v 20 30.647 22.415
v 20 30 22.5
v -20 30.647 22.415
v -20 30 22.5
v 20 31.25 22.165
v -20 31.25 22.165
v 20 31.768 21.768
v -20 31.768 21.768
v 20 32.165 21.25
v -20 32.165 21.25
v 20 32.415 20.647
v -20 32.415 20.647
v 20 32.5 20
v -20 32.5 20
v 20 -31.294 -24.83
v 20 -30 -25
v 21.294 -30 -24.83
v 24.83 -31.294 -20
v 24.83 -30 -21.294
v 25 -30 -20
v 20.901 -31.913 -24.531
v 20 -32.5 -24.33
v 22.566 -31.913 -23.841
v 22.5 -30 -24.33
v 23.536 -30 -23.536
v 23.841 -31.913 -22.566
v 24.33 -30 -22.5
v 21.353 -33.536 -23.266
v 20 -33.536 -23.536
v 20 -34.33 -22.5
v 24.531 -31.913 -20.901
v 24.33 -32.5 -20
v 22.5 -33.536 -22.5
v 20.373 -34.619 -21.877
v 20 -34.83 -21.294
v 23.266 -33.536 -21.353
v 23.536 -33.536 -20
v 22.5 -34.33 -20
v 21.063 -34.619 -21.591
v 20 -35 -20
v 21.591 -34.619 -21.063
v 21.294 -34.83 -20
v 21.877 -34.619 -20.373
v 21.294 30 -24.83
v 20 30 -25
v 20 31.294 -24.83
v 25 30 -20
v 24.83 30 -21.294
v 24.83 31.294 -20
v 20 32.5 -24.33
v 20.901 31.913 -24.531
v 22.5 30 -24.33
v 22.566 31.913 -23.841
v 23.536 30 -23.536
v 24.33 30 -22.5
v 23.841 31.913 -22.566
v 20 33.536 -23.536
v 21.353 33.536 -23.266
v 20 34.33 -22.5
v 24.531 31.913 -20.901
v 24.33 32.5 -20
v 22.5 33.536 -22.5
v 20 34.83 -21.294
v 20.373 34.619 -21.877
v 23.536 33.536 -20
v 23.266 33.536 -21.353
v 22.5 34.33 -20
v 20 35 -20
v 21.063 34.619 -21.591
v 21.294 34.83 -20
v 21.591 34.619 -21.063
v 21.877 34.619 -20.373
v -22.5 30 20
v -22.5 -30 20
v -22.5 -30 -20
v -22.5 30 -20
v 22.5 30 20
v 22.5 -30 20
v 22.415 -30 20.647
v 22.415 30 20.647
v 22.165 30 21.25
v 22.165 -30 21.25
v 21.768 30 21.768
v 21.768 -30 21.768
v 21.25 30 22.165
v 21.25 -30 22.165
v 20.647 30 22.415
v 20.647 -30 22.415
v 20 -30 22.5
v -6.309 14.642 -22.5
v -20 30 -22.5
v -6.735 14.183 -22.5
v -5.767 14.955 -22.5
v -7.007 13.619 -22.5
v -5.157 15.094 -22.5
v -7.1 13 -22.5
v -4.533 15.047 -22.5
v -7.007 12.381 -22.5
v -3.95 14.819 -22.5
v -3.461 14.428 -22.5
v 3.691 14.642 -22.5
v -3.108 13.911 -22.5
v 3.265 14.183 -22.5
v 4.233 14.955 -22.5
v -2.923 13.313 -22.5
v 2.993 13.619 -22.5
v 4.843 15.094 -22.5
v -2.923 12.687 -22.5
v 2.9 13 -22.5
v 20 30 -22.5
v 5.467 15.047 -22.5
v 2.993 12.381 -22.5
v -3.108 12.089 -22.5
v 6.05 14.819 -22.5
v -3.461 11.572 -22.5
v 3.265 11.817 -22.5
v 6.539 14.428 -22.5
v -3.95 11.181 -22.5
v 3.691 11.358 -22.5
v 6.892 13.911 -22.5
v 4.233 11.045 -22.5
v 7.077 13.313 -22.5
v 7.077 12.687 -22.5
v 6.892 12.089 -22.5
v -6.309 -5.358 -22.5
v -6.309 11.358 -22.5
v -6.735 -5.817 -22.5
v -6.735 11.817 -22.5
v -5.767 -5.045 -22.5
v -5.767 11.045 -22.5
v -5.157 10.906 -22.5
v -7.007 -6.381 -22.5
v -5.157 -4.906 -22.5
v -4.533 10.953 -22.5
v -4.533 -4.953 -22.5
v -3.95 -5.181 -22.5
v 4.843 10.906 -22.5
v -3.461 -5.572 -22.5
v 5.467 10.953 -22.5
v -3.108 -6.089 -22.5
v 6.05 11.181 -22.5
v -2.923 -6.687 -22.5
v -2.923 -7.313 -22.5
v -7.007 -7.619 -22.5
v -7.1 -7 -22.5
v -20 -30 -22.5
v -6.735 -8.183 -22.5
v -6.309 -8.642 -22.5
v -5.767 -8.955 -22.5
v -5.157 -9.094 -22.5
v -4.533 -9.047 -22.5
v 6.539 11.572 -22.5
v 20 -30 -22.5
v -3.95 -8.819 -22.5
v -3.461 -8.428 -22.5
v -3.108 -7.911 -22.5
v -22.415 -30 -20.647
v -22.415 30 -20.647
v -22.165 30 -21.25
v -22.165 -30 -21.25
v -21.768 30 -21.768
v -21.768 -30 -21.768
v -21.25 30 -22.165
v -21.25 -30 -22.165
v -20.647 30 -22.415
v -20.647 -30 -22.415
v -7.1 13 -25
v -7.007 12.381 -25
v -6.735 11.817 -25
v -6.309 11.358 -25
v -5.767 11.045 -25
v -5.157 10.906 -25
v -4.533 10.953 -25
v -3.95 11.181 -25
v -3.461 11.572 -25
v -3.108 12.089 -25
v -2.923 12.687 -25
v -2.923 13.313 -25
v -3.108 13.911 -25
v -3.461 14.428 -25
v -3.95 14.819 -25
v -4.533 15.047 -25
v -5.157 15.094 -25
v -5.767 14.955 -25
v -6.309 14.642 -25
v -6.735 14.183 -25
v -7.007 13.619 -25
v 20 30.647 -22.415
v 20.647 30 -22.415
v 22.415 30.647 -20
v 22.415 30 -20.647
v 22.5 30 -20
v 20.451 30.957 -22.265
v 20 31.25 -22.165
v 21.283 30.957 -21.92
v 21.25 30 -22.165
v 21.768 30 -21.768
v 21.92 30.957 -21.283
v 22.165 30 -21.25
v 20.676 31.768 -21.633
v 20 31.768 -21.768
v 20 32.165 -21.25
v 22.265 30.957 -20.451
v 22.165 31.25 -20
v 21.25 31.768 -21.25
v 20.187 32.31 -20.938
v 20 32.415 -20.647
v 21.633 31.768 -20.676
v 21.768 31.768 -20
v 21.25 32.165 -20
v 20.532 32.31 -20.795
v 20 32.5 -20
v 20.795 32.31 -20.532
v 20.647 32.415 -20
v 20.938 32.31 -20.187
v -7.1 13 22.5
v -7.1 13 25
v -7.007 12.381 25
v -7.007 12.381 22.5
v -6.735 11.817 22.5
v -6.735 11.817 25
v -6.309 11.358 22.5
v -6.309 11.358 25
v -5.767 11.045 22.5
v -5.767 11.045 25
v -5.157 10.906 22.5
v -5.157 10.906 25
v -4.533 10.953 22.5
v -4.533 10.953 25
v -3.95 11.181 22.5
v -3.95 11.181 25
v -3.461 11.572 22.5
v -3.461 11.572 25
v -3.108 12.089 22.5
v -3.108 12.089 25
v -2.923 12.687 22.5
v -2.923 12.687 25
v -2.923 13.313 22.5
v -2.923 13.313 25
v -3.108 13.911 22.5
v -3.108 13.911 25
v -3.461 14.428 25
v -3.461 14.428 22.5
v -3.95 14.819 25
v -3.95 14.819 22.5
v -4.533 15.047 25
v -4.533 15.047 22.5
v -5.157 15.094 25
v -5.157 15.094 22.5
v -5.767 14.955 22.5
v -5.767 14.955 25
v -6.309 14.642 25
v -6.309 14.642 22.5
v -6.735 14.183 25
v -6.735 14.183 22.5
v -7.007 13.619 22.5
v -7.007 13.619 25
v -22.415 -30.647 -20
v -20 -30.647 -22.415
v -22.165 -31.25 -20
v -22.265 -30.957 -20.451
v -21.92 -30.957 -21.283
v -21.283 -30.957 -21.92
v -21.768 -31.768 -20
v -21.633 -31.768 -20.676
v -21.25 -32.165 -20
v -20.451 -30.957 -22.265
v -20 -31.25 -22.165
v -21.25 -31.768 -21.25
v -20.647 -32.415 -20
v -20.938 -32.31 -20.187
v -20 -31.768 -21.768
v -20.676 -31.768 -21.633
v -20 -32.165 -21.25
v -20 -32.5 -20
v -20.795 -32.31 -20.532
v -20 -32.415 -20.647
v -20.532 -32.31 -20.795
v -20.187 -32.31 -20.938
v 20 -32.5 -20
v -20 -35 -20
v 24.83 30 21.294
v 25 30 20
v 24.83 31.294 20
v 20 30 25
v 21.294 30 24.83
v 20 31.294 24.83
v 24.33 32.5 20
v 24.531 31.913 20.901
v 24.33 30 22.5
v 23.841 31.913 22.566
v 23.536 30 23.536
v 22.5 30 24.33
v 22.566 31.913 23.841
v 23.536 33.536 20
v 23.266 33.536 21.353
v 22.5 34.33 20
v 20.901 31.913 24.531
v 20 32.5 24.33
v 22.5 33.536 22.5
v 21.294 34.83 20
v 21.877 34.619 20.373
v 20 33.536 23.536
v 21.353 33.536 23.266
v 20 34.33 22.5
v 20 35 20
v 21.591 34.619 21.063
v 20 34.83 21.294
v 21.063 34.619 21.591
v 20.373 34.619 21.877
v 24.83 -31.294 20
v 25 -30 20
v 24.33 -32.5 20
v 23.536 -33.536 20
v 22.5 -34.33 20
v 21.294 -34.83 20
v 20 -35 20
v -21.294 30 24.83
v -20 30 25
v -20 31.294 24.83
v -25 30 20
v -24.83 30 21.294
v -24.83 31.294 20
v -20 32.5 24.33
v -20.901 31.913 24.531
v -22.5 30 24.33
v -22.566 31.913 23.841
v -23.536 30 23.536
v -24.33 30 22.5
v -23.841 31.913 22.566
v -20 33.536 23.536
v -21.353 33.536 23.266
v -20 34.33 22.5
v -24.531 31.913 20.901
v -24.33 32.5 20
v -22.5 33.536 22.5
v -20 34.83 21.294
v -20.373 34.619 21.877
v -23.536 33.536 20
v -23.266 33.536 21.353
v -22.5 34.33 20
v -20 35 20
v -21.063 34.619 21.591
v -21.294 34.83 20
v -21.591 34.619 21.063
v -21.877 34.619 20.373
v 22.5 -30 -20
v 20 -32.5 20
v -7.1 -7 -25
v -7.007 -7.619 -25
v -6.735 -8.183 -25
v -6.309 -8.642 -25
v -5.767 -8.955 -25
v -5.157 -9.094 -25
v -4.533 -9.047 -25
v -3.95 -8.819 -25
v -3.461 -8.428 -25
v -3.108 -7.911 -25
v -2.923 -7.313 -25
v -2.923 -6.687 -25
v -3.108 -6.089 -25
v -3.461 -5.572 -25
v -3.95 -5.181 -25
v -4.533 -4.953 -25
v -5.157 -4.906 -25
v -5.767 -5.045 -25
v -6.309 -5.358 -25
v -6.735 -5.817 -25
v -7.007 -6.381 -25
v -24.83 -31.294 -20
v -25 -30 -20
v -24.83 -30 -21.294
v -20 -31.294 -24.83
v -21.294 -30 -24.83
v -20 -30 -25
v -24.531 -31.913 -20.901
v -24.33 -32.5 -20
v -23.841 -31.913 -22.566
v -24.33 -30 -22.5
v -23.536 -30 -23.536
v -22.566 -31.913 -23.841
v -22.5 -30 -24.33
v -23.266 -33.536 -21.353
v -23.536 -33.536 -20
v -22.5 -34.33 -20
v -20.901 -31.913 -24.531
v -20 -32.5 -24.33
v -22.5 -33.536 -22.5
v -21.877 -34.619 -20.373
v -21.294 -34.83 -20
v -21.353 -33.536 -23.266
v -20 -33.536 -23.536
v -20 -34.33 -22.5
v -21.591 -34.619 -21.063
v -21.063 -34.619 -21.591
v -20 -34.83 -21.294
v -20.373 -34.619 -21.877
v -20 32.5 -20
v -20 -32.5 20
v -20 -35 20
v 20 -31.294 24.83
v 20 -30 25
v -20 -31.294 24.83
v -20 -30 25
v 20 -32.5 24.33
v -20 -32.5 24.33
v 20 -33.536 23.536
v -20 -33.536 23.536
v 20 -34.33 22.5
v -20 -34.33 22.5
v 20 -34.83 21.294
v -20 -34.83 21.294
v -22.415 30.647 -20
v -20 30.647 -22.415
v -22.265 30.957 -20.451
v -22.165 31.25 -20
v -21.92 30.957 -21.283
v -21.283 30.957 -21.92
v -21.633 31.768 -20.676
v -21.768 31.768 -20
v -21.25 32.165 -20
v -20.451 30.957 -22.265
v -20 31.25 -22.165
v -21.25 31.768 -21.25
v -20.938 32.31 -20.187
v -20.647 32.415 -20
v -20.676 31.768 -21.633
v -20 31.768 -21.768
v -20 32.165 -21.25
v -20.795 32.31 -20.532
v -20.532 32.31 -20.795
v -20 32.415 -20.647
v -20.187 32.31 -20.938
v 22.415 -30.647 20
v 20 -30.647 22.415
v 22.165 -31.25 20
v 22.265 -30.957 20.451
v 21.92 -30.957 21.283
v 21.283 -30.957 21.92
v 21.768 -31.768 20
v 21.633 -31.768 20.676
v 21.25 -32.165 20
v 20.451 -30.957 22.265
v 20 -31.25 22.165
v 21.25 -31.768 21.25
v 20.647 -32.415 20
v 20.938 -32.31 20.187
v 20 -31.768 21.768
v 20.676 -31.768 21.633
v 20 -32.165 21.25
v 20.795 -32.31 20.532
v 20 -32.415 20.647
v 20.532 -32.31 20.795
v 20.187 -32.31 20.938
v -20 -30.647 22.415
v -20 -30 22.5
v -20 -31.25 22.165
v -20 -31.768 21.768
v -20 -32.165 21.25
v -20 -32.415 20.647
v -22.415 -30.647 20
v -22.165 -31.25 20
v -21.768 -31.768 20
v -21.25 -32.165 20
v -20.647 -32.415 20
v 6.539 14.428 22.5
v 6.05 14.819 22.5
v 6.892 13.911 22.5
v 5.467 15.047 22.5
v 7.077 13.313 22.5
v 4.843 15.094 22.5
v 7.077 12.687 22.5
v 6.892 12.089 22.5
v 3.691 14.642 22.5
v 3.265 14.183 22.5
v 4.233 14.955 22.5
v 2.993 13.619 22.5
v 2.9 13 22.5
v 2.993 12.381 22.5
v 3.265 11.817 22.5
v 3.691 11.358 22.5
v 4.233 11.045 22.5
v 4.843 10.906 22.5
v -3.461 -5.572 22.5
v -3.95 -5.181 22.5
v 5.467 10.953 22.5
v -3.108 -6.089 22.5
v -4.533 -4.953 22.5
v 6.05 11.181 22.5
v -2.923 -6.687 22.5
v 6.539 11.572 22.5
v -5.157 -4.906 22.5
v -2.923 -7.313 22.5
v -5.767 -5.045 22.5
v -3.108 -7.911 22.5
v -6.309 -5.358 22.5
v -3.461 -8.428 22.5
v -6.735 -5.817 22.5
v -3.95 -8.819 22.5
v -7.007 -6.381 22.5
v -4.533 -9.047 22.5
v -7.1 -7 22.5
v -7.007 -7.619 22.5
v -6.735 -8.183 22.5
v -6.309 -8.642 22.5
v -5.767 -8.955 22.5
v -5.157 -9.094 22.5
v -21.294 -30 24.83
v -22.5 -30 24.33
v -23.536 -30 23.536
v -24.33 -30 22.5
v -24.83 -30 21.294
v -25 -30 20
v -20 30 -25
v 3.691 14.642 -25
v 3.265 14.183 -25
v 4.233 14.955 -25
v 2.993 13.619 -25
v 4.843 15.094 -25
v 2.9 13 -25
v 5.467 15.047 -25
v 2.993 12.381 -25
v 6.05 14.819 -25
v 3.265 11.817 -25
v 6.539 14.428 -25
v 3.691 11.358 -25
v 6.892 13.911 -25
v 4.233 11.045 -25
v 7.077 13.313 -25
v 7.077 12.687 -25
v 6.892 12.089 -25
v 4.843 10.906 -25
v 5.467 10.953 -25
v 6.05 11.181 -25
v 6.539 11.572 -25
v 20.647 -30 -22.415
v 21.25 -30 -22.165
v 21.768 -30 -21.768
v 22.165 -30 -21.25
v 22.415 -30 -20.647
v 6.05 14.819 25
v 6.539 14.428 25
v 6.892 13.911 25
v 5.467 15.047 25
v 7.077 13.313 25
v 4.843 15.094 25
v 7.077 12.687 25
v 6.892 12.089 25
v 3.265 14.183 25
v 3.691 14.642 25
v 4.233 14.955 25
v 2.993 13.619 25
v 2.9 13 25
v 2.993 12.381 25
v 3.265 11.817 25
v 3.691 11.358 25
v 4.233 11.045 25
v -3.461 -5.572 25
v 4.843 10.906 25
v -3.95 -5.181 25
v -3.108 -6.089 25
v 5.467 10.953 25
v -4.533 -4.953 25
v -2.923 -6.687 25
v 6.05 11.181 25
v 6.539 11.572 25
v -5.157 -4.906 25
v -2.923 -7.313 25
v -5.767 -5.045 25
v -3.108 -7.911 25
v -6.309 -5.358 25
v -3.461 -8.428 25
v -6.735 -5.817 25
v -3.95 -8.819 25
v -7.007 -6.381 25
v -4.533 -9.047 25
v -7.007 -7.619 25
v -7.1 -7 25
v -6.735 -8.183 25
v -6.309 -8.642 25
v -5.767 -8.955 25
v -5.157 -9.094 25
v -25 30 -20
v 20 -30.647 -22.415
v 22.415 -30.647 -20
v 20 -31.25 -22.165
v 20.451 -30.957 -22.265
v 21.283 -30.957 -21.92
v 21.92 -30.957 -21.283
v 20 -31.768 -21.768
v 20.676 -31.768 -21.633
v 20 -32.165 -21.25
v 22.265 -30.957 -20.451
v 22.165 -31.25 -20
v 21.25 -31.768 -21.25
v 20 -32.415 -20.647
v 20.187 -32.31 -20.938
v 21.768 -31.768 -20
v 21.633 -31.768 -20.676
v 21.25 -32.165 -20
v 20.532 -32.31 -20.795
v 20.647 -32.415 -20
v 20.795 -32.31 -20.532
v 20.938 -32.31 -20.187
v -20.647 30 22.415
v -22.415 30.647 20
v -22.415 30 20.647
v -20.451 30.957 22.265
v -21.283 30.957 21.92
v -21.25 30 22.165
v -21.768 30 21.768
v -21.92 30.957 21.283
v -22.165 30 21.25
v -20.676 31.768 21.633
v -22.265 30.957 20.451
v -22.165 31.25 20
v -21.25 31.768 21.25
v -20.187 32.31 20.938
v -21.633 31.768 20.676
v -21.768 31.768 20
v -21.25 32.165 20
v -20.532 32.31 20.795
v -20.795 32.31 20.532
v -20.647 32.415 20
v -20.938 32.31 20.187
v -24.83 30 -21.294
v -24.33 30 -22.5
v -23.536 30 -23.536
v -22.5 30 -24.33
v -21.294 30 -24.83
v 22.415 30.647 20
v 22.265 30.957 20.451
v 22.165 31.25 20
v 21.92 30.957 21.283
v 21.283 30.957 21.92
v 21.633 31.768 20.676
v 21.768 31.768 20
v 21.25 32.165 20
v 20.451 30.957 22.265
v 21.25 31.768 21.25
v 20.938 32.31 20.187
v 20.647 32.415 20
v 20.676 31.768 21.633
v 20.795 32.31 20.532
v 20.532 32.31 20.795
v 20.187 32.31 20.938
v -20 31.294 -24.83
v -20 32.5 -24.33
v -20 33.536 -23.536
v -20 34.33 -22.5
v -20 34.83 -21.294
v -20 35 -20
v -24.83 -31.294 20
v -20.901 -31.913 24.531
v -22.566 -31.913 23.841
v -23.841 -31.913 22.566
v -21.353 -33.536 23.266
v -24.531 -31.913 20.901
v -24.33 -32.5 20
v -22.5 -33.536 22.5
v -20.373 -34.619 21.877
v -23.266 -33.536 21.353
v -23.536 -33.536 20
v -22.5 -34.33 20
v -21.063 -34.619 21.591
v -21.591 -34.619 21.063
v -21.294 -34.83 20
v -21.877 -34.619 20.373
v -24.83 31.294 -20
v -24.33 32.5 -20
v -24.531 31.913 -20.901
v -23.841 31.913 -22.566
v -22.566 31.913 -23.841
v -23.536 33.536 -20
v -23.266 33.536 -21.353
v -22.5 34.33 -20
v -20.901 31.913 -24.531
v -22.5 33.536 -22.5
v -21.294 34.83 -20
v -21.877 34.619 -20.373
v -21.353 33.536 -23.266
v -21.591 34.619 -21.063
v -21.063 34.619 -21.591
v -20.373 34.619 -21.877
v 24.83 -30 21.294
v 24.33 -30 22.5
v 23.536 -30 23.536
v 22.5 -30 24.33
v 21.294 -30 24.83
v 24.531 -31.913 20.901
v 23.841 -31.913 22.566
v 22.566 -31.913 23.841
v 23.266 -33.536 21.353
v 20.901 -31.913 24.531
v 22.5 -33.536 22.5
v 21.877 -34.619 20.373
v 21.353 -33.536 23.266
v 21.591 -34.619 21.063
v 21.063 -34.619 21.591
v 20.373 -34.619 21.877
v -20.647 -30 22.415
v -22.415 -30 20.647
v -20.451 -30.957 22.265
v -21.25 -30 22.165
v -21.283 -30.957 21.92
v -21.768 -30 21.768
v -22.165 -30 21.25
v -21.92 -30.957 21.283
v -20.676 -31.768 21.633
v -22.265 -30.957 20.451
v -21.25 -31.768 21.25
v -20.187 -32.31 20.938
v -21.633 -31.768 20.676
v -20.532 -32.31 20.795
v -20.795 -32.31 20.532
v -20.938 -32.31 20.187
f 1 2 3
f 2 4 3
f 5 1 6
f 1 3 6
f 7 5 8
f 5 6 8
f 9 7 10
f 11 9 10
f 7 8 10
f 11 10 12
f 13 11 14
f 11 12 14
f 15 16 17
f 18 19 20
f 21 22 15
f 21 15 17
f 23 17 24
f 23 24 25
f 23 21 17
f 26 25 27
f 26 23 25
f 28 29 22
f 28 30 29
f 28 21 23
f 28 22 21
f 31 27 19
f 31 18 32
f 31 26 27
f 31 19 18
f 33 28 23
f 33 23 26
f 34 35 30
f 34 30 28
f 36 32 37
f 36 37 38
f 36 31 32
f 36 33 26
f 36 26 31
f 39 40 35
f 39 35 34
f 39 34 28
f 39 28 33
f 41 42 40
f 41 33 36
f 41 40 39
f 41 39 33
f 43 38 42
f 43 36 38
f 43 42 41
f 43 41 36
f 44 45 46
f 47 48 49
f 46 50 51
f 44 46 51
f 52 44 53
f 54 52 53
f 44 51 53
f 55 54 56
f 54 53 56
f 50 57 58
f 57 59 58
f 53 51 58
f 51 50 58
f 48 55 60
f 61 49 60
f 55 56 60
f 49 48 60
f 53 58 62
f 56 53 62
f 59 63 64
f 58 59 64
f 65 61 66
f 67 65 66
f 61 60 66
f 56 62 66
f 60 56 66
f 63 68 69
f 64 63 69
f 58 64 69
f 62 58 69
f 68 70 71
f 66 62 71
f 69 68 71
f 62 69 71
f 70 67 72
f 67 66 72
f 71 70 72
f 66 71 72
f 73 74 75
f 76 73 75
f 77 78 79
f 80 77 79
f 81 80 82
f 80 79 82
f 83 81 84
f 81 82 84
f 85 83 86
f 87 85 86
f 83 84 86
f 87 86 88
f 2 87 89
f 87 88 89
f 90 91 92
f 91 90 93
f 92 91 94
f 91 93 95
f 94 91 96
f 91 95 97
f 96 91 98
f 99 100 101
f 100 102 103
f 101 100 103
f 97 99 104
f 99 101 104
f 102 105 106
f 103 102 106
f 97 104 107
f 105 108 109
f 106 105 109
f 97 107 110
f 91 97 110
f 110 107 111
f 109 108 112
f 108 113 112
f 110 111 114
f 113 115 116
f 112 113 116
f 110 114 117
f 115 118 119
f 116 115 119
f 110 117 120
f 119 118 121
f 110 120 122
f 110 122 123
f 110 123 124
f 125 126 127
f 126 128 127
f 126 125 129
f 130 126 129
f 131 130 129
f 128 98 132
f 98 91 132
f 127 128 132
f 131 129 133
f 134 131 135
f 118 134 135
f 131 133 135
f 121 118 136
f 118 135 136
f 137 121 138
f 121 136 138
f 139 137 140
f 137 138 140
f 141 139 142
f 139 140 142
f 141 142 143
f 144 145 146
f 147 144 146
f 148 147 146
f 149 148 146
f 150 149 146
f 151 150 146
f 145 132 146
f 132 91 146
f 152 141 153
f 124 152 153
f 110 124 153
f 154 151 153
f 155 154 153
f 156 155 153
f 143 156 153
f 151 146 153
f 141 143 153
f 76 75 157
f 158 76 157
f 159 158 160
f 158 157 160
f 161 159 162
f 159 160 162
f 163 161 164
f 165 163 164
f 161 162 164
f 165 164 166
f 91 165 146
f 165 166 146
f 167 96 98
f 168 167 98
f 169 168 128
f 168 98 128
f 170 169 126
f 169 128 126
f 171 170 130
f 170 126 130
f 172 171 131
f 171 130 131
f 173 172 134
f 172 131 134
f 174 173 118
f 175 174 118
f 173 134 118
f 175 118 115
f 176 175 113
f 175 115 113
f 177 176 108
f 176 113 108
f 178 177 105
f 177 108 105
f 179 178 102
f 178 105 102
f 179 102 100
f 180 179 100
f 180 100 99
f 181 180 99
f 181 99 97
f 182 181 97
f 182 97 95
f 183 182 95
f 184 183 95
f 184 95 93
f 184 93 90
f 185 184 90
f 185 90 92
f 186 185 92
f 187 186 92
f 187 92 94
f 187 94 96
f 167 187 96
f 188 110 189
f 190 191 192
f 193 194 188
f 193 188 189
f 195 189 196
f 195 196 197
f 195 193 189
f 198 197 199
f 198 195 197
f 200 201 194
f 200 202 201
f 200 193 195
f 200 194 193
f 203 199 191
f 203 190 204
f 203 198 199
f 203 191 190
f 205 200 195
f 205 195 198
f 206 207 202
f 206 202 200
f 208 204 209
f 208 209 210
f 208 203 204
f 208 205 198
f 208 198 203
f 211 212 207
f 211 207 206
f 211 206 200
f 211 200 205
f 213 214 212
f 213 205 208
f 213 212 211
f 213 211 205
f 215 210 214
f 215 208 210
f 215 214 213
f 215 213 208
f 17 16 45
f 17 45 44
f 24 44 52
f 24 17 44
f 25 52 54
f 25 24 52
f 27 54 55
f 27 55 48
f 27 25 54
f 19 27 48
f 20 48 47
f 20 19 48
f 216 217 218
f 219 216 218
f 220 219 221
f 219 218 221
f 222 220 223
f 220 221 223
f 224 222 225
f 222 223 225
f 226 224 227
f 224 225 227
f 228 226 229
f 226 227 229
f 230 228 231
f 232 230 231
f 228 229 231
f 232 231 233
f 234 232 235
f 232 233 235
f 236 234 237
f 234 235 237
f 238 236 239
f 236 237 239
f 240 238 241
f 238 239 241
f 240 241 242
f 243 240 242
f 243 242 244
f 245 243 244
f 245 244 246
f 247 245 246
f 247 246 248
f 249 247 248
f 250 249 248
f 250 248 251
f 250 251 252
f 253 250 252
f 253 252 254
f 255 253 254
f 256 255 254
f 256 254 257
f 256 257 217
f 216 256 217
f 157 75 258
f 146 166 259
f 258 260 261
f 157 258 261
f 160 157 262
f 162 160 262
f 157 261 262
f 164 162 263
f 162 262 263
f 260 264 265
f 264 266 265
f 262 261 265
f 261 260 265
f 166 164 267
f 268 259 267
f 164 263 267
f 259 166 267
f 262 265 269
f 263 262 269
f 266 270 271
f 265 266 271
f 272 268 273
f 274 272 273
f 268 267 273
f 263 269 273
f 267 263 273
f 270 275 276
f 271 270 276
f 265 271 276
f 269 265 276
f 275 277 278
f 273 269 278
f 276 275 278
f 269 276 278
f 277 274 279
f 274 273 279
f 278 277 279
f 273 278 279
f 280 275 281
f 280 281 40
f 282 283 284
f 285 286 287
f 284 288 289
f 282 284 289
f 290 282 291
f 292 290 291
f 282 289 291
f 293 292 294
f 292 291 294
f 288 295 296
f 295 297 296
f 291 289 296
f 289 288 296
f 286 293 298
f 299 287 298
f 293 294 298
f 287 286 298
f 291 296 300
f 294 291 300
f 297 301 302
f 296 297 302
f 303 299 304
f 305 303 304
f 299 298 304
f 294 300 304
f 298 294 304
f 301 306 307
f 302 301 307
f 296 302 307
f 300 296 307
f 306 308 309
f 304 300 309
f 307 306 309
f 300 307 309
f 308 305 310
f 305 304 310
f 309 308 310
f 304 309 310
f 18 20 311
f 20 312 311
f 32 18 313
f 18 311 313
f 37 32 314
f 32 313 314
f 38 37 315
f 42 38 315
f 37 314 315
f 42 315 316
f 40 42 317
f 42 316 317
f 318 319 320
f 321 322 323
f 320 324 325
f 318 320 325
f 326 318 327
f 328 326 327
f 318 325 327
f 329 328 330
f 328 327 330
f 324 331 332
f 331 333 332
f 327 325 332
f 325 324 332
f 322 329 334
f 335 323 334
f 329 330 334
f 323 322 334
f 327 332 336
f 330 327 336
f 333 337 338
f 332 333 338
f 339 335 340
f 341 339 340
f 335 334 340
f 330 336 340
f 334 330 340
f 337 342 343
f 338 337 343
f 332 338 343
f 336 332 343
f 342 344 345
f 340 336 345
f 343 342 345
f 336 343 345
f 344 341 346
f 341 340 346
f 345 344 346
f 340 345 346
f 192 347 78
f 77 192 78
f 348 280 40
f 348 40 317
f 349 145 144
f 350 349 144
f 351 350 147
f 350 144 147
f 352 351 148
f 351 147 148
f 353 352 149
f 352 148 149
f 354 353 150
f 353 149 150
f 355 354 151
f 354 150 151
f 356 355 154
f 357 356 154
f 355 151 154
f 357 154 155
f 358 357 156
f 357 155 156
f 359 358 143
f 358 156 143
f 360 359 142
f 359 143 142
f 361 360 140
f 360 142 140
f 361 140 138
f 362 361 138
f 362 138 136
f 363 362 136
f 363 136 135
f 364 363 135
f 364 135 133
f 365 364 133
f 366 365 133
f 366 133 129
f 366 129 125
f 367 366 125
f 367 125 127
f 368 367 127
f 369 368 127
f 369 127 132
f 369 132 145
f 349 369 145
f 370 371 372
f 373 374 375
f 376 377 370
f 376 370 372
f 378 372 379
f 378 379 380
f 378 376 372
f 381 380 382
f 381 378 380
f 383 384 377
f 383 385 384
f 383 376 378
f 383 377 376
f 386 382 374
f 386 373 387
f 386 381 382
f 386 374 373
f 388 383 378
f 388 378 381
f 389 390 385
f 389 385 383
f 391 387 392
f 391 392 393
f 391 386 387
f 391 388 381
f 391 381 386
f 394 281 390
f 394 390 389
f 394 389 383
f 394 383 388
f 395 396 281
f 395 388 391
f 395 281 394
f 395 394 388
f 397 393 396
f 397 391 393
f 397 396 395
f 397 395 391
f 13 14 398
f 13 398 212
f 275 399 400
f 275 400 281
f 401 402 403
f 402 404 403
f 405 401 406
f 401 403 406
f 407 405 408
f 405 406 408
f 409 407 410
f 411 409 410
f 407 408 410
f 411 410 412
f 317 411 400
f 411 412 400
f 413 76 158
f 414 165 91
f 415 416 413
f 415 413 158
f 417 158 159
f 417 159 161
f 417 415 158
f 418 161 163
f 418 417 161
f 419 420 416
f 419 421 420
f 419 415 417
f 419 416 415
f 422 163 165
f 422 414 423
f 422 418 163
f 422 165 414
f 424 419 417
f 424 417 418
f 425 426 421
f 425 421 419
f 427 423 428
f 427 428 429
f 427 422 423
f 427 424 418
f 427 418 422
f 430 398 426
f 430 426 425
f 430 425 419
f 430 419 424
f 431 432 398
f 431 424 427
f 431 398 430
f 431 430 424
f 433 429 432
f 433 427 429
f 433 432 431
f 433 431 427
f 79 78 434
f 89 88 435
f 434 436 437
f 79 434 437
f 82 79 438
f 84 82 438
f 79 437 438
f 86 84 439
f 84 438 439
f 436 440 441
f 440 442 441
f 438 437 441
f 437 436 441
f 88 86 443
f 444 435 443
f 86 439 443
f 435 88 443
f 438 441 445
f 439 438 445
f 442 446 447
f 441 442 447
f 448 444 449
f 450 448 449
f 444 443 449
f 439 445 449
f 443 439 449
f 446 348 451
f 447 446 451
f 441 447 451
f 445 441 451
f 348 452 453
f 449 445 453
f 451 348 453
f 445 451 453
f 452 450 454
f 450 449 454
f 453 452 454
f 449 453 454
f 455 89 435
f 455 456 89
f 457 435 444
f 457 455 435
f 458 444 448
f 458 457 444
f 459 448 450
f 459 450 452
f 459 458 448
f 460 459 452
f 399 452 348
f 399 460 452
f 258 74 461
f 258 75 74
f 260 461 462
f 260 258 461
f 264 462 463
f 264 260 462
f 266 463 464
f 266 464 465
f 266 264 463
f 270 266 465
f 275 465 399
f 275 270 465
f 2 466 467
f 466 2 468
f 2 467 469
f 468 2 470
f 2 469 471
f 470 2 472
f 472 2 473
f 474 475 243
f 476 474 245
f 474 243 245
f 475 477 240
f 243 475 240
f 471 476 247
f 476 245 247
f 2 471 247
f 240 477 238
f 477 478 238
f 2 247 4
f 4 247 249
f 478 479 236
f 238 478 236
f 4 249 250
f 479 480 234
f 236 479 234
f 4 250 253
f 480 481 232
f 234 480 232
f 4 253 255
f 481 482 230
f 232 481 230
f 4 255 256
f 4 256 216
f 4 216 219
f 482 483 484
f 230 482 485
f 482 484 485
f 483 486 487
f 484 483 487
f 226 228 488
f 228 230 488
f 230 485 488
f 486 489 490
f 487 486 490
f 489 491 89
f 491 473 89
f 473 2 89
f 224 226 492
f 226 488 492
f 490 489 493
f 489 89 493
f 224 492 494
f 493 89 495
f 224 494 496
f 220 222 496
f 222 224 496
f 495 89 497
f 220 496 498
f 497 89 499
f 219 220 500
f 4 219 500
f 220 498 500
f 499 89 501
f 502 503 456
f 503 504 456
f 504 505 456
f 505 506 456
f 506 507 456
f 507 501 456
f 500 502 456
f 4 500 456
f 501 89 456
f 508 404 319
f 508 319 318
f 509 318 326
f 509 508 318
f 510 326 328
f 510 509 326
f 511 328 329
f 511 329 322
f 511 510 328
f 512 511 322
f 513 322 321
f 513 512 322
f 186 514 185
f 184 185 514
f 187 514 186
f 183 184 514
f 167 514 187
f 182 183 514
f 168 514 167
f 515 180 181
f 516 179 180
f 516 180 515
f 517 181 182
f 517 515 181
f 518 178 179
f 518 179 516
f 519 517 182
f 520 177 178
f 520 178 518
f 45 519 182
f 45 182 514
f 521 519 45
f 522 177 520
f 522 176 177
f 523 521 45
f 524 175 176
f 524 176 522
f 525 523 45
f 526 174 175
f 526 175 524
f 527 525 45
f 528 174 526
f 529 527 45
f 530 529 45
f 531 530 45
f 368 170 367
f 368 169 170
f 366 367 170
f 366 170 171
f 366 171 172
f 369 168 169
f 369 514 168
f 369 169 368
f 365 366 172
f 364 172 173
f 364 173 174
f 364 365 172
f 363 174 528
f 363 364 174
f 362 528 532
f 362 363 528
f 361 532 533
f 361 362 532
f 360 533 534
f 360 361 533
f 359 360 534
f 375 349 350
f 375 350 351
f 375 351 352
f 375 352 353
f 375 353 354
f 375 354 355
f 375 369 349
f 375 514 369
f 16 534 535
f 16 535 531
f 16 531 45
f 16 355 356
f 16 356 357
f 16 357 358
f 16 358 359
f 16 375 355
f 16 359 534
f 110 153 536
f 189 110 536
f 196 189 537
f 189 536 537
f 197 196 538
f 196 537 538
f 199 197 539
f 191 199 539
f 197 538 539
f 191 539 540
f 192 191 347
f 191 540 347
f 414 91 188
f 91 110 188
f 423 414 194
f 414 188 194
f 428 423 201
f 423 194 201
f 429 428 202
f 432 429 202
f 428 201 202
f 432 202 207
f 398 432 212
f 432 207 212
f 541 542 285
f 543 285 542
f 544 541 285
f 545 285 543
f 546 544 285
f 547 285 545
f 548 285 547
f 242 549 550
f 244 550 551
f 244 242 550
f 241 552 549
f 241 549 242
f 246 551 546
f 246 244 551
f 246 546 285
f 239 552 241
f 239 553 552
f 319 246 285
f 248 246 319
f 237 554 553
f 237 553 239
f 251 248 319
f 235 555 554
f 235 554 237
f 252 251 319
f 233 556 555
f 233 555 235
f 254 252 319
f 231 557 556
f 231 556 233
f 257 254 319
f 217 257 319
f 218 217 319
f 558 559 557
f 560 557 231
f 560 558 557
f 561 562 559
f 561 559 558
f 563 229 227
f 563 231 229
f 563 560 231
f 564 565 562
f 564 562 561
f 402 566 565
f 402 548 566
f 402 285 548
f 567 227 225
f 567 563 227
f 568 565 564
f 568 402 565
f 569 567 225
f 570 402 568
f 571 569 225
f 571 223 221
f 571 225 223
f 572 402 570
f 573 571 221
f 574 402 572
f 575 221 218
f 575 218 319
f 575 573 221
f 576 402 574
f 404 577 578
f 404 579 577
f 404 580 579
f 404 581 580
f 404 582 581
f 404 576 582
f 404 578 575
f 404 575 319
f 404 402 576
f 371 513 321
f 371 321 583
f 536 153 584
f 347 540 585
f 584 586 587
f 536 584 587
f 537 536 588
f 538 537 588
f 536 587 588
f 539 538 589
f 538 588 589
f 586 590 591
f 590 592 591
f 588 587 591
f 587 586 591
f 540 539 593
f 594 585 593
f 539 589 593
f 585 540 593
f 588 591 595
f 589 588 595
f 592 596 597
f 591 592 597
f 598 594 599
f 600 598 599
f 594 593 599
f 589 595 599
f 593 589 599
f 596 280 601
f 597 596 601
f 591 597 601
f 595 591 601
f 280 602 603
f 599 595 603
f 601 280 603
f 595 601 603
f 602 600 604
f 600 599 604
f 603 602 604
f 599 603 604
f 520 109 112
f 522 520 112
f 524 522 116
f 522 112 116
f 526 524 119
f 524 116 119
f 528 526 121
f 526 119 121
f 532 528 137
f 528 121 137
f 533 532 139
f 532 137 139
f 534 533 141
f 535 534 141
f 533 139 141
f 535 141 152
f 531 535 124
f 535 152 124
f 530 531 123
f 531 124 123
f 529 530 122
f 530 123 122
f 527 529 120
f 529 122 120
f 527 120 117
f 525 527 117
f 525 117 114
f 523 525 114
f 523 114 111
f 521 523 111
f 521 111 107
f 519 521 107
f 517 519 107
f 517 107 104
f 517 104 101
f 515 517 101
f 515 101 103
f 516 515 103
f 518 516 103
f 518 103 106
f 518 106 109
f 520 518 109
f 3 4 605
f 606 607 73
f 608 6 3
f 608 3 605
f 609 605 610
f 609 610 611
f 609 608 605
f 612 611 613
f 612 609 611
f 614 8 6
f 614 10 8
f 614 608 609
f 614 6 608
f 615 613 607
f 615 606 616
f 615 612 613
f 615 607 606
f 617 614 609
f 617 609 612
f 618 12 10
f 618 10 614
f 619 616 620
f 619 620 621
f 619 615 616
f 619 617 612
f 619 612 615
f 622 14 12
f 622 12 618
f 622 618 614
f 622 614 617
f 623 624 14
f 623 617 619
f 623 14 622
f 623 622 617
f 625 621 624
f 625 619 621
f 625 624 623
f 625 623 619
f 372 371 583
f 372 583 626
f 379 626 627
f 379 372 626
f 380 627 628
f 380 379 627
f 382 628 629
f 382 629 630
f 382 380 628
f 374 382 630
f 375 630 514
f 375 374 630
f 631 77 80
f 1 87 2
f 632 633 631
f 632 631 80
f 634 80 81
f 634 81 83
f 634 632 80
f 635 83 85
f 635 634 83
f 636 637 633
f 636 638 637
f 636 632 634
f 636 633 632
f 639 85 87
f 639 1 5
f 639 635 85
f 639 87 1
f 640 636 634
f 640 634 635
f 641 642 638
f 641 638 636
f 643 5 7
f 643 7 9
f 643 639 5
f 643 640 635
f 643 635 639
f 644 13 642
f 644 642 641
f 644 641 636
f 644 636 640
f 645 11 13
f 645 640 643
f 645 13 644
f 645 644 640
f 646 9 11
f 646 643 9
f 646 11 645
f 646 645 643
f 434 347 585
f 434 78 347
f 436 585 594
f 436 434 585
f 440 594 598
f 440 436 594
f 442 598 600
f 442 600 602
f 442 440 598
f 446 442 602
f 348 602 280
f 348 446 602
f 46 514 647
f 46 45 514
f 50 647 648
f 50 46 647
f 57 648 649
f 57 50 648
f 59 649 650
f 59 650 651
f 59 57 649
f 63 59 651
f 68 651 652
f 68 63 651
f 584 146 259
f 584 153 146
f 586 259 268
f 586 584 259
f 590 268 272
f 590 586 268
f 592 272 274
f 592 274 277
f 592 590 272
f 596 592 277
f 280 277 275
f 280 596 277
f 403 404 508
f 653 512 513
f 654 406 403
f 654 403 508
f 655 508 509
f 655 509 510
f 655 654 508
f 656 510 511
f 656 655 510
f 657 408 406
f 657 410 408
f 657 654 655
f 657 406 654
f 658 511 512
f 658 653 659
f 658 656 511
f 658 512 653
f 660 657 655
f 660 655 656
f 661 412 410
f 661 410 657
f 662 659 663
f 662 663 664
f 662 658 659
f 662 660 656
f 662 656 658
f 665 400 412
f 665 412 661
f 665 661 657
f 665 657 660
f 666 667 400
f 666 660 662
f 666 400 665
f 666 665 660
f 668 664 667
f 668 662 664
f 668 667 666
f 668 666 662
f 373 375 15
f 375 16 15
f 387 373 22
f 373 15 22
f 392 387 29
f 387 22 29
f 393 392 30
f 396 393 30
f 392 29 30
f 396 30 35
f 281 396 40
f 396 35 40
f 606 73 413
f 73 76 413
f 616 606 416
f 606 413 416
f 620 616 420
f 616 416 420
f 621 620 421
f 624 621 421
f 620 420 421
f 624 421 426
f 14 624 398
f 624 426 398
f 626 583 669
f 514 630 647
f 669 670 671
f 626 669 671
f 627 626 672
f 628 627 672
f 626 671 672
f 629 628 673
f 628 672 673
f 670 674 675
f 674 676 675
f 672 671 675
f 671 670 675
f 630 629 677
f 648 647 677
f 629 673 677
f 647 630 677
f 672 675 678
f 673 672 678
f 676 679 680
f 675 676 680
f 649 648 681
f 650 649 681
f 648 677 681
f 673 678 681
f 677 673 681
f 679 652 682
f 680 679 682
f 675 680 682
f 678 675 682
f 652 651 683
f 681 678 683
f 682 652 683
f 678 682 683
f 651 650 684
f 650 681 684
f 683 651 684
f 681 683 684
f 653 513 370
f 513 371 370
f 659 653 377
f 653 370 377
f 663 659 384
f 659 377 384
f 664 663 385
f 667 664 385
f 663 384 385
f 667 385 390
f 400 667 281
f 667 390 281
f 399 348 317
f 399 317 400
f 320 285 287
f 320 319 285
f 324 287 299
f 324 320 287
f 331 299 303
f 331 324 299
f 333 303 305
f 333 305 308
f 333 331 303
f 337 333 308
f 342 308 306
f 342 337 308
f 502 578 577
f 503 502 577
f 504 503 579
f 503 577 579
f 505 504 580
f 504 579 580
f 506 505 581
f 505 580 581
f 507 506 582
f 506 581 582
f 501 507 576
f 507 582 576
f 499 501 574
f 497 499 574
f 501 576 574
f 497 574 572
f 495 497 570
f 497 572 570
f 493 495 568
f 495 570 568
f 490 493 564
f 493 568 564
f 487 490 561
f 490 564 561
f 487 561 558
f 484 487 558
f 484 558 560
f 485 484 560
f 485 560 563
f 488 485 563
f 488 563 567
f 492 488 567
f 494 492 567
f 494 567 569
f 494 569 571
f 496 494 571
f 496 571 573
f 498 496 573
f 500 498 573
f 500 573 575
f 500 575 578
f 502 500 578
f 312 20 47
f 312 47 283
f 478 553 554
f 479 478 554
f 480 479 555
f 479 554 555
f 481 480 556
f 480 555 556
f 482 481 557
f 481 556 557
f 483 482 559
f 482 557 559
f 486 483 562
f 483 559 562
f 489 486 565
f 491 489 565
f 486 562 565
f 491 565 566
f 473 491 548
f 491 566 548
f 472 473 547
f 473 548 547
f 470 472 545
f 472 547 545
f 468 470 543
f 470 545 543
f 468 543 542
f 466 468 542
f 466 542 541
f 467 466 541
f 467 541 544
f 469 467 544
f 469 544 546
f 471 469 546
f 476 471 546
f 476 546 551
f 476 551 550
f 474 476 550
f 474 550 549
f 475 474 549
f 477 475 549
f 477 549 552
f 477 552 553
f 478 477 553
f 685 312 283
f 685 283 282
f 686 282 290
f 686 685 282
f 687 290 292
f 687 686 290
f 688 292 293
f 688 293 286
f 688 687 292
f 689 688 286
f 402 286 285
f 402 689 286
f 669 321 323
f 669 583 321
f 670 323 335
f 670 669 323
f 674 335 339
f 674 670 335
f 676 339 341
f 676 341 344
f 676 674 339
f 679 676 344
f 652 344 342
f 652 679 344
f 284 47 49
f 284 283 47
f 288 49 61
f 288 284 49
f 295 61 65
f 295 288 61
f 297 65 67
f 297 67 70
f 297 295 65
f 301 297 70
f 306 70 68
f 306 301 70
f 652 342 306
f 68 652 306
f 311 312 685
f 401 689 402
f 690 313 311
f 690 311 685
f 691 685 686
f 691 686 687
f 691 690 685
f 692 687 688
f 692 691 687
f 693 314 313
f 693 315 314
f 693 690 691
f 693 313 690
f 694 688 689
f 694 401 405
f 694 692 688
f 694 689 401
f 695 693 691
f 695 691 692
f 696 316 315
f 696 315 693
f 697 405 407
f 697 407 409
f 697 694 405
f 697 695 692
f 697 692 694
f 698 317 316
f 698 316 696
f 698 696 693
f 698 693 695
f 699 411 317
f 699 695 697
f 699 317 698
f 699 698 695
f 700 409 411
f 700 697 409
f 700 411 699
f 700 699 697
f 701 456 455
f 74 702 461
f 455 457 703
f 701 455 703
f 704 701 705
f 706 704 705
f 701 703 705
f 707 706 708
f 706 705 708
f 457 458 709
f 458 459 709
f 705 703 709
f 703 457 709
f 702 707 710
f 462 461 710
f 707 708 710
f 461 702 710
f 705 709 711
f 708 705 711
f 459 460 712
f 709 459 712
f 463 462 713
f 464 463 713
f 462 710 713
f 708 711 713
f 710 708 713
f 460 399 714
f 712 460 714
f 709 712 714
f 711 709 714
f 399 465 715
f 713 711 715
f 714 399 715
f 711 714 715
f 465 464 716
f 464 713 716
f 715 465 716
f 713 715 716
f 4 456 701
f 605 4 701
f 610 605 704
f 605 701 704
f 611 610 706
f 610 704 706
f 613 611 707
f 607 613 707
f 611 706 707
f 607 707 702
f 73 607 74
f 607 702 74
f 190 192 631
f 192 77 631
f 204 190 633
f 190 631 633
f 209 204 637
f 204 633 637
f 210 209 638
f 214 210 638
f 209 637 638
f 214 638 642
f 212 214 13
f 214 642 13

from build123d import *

# Parameters (mm, degrees)
F1_DEPTH = 35
F2_R     = 5
F3_T     = -2.5
F5_D     = 4.2


# Not quite as in the source:
# - a shell that OpenCascade refuses in one call is made with other operations: the cavity is built on its own and cut out


with BuildPart() as f1:
    # F0 (on Front) → F1 (new body, symmetric)
    with BuildSketch(Plane.XZ):
        with BuildLine():
            Line((20, 25), (-20, 25))
            ThreePointArc((-20, 25), (-23.5355339059, 23.5355339059), (-25, 20))
            Line((-25, 20), (-25, -20))
            ThreePointArc((-25, -20), (-23.5355339059, -23.5355339059), (-20, -25))
            Line((-20, -25), (20, -25))
            ThreePointArc((20, -25), (23.5355339059, -23.5355339059), (25, -20))
            Line((25, -20), (25, 20))
            ThreePointArc((25, 20), (23.5355339059, 23.5355339059), (20, 25))
        make_face()
    extrude(amount=F1_DEPTH, both=True)

    # F2
    f2_edges = [f1.edges().sort_by_distance(p)[0] for p in [
        (0, 35, 25),
        (-23.535534, 35, 23.535534),
        (-25, 35, 0),
        (-23.535534, 35, -23.535534),
        (0, 35, -25),
        (23.535534, 35, -23.535534),
        (25, 35, 0),
        (23.535534, 35, 23.535534),
        (0, -35, 25),
        (-23.535534, -35, 23.535534),
        (-25, -35, 0),
        (-23.535534, -35, -23.535534),
        (0, -35, -25),
        (23.535534, -35, -23.535534),
        (25, -35, 0),
        (23.535534, -35, 23.535534),
    ]]
    fillet(f2_edges, radius=F2_R)

    # F3: a shell. OpenCascade refuses it in one call, so the cavity is built on its own and cut out:
    # the body offset inwards by the wall thickness, plus a prism from it out through each open face.
    f3_core = offset(f1.part, amount=F3_T, mode=Mode.PRIVATE)
    f3_exits = [f3_core.faces().sort_by_distance(p)[0] for p in [
        (0, -32.5, 0),
    ]]
    add(f3_core, mode=Mode.SUBTRACT)
    extrude(f3_exits, amount=-F3_T, mode=Mode.SUBTRACT)

    # F5 (through all)
    with Locations(Plane(origin=(0, 0, -25), x_dir=(1, 0, 0), z_dir=(0, 0, -1))):
        with Locations((5, -13), (-5, 7), (-5, -13)):
            Hole(F5_D / 2)


solid = f1.part
